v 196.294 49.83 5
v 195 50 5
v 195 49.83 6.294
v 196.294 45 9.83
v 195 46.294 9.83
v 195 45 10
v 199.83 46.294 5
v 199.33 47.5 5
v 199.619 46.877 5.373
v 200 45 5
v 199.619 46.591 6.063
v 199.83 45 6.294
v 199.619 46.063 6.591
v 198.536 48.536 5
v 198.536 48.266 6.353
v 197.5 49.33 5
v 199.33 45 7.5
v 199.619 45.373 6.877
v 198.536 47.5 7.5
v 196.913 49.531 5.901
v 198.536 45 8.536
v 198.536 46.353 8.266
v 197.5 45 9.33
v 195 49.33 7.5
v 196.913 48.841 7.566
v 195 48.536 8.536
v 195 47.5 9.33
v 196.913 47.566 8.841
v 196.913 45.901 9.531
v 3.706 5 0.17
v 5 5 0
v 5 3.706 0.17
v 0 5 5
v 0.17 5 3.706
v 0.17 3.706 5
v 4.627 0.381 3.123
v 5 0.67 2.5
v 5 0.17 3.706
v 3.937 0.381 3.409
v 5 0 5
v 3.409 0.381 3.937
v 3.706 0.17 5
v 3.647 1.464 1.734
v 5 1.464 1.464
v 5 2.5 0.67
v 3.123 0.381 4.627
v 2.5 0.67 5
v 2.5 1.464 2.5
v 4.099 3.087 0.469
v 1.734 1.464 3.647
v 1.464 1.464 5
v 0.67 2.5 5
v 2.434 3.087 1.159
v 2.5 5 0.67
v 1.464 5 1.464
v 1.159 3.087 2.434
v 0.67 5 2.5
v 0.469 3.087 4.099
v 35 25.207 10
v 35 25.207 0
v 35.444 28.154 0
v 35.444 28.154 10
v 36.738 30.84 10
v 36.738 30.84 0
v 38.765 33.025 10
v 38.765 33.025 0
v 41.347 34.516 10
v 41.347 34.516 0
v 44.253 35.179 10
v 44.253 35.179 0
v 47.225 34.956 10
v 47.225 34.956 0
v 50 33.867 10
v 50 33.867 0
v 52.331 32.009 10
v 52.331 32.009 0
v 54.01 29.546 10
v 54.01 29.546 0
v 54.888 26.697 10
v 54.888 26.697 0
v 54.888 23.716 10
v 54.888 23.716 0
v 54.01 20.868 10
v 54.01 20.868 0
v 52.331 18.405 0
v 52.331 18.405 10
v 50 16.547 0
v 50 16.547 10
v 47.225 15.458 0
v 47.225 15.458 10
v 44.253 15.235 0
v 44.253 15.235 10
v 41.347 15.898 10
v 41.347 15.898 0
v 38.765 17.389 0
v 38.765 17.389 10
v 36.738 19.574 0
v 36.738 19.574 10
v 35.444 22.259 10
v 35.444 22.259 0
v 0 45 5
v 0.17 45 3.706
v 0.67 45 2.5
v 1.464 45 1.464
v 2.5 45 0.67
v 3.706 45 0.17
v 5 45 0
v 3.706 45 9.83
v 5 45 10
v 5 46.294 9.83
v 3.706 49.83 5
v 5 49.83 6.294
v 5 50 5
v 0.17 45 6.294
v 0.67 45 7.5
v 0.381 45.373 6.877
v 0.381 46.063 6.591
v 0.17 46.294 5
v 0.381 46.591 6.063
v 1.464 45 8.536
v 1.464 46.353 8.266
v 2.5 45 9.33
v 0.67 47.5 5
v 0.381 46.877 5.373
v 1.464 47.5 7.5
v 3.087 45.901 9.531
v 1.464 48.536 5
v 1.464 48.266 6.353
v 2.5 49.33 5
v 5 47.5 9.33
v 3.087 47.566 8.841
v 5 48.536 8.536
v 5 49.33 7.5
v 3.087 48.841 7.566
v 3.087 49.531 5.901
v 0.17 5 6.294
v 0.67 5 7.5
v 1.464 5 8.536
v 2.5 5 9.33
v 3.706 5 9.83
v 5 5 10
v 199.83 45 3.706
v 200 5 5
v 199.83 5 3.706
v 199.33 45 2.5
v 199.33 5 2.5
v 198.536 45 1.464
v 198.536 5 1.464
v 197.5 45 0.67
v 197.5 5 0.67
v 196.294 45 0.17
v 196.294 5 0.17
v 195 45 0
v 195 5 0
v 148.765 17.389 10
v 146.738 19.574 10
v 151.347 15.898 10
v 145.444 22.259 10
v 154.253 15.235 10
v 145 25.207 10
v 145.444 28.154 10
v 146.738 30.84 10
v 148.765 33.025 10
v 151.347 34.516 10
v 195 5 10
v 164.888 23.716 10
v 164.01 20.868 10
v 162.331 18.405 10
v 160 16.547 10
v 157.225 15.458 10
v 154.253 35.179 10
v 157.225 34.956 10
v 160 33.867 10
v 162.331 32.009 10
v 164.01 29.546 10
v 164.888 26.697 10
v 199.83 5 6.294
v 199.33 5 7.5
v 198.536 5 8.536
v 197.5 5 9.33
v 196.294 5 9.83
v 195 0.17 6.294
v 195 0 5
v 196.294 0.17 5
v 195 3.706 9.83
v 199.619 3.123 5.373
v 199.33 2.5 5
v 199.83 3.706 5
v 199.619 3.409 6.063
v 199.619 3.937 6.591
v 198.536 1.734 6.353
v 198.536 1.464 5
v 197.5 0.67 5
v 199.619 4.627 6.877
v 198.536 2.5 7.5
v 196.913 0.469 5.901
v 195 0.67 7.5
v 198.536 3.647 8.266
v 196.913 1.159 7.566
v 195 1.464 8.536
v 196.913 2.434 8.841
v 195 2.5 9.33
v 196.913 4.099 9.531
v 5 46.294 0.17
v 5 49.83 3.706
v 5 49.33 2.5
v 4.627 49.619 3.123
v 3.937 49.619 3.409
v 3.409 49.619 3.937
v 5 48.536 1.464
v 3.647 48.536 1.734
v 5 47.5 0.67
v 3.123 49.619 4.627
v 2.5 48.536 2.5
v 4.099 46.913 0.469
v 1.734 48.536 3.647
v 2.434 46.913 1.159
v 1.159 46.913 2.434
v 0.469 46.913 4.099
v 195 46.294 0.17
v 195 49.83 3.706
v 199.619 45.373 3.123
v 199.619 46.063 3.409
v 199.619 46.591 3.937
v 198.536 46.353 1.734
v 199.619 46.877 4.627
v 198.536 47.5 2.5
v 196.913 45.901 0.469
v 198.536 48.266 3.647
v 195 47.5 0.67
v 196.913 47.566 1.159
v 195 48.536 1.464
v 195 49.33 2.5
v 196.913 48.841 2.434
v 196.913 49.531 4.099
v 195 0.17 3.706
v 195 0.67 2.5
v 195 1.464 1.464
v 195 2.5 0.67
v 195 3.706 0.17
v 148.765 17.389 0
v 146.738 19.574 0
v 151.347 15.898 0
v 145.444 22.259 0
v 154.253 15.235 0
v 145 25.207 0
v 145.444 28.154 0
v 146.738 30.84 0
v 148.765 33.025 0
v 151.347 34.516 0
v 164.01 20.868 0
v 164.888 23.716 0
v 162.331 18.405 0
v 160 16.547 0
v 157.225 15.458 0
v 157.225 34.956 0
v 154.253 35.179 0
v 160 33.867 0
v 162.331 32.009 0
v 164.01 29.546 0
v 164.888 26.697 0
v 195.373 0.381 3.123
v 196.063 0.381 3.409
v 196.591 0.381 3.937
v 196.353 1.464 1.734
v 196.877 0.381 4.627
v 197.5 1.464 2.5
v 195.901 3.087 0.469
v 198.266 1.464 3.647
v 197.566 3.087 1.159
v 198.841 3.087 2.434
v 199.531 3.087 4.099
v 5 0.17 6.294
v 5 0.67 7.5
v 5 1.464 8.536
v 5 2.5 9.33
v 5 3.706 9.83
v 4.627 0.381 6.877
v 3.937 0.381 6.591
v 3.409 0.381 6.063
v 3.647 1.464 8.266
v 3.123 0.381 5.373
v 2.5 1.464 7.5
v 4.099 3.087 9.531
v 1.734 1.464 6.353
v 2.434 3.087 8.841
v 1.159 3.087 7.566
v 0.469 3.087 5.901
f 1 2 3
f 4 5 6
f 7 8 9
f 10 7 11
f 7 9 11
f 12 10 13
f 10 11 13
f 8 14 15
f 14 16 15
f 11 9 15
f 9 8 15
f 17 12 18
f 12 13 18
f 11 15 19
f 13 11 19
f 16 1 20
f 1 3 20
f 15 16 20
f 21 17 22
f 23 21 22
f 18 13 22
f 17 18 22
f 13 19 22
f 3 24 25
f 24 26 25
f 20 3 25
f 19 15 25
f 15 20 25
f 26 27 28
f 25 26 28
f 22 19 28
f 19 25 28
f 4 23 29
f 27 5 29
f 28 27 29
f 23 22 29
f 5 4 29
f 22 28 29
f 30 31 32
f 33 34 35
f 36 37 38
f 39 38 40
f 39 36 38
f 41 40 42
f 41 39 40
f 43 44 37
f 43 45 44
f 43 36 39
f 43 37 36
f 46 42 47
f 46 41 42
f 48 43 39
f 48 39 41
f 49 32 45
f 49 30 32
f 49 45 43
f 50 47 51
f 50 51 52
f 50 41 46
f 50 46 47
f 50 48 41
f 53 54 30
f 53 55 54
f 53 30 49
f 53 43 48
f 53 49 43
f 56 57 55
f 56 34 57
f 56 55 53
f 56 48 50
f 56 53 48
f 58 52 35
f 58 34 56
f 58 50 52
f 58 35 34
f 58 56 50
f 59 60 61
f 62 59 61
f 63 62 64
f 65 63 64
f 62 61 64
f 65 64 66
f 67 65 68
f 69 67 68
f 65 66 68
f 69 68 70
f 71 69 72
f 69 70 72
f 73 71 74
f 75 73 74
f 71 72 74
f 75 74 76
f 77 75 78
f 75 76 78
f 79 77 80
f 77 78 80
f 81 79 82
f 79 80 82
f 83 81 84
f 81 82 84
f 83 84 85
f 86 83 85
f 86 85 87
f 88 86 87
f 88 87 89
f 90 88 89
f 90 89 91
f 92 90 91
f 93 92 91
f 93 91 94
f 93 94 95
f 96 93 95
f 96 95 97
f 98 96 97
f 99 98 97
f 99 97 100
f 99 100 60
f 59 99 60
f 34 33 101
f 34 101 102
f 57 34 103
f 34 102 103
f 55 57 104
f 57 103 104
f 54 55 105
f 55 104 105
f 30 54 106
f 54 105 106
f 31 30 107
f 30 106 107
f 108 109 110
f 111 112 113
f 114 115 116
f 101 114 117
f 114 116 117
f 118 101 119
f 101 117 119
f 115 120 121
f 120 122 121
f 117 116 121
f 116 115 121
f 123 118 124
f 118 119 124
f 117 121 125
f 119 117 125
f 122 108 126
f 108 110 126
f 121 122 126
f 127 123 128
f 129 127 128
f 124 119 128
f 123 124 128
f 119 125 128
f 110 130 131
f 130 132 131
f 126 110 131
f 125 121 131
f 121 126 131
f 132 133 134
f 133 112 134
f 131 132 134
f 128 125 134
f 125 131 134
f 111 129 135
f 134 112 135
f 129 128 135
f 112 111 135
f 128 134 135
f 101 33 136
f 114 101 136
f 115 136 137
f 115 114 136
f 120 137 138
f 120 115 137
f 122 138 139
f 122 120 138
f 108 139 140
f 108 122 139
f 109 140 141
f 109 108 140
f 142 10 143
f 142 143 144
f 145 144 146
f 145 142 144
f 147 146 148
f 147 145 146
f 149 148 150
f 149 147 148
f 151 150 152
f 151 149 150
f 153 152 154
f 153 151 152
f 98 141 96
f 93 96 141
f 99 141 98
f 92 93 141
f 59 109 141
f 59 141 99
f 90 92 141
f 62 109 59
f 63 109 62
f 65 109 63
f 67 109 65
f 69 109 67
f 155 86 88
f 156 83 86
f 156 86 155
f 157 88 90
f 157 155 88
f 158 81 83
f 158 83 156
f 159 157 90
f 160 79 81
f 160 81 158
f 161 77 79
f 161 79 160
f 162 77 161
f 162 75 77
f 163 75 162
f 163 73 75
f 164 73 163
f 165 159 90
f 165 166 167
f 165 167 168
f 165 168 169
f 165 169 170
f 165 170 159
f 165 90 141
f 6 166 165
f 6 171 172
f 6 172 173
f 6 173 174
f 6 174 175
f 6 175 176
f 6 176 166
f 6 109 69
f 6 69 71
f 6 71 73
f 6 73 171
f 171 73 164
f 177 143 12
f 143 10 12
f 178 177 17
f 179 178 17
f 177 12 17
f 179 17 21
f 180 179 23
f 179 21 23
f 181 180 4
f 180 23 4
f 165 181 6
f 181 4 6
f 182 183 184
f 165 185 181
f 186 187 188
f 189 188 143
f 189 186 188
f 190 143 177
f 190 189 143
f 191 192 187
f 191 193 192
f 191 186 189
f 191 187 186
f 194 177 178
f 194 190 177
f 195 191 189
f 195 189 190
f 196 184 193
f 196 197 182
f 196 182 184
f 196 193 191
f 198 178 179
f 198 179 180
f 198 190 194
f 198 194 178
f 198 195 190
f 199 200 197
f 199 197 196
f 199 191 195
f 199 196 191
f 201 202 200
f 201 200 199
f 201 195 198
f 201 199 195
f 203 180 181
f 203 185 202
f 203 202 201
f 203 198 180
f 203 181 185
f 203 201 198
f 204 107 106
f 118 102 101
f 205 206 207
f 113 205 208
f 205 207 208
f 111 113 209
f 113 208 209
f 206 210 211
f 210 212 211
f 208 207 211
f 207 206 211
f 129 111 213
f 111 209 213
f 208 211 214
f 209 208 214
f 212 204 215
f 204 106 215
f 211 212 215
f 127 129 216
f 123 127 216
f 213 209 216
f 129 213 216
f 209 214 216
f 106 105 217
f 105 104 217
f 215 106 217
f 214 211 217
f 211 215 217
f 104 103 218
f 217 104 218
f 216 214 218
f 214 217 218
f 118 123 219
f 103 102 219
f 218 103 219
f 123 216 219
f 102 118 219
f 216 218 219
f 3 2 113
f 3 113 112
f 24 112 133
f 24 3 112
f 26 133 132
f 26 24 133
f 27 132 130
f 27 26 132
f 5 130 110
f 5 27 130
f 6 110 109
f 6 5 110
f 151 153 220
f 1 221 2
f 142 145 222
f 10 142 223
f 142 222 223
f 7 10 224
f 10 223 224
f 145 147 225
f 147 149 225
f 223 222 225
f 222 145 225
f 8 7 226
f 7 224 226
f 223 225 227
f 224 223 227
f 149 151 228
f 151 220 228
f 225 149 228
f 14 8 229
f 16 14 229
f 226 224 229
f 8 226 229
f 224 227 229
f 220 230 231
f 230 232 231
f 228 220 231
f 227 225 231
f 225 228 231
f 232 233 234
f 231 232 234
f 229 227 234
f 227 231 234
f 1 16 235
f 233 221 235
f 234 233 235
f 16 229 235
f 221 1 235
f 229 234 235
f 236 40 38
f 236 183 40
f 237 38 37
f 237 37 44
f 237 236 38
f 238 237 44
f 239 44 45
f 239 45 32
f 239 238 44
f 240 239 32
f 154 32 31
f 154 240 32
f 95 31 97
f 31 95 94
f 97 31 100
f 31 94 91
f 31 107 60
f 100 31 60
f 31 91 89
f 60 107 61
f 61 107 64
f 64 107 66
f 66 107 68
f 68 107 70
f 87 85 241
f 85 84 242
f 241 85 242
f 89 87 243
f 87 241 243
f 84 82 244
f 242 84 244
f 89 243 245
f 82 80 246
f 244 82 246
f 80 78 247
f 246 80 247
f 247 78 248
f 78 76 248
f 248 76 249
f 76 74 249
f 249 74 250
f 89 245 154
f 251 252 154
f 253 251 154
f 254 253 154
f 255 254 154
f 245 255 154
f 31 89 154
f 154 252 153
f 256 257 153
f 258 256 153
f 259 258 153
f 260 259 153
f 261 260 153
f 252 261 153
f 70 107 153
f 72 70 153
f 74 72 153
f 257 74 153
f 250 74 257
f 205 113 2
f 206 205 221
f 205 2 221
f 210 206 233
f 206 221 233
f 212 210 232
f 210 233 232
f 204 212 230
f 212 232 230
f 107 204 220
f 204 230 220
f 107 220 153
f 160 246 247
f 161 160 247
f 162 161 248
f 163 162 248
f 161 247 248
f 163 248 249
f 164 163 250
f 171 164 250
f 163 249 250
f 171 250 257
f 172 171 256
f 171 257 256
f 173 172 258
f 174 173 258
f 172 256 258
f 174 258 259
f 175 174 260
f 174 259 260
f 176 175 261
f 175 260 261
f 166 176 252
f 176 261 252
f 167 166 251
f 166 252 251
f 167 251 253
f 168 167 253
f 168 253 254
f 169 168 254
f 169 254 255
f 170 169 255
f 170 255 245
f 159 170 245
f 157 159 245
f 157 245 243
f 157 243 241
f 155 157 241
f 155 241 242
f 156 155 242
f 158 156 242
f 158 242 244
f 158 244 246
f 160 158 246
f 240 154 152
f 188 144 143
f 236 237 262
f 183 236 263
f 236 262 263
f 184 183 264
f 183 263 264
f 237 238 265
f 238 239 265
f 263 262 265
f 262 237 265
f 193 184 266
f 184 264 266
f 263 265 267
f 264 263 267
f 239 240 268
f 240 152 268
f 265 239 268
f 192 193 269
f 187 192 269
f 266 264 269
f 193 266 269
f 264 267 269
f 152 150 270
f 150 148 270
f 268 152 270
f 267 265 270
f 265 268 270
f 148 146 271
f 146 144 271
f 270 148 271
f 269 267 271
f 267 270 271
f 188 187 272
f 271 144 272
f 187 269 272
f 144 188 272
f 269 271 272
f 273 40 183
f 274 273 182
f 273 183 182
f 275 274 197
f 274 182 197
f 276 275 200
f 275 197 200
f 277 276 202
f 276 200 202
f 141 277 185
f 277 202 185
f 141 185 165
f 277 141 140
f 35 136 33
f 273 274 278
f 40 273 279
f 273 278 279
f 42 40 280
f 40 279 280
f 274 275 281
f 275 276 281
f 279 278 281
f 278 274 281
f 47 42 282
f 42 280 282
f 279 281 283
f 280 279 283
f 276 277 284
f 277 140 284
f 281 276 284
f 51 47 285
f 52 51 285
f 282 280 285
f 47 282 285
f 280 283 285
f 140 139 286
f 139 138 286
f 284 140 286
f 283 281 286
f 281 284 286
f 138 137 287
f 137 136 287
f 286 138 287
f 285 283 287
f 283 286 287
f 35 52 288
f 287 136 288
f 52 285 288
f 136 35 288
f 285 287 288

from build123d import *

# Parameters (mm, degrees)
ESBO_O1_W                = 200
ESBO_O1_H                = 50
RESSALTO_EXTRUS_O1_DEPTH = 10
FILETE1_R                = 5
FUROS_GUIA_COM_20_0MM1_D = 20


with BuildPart() as part:
    # Esboço1 → Ressalto-extrusão1 (new body)
    with BuildSketch(Plane.XY):
        with Locations((100, 25)):
            Rectangle(ESBO_O1_W, ESBO_O1_H)
    extrude(amount=RESSALTO_EXTRUS_O1_DEPTH)

    # Filete1
    filete1_edges = [part.edges().sort_by_distance(p)[0] for p in [
        (100, 50, 10),
        (0, 25, 10),
        (100, 0, 10),
        (0, 25, 0),
        (100, 50, 0),
        (200, 25, 0),
        (100, 0, 0),
        (0, 0, 5),
        (0, 50, 5),
        (200, 50, 5),
        (200, 0, 5),
        (200, 25, 10),
    ]]
    fillet(filete1_edges, radius=FILETE1_R - 0.0001)  # a hair under: the kernel refuses the full size

    # Furos-guia com Ø20.0mm1 (through all)
    with Locations(Plane.XY.offset(10)):
        with Locations((45, 25.206865572), (155, 25.206865572)):
            Hole(FUROS_GUIA_COM_20_0MM1_D / 2)


solid = part.part
